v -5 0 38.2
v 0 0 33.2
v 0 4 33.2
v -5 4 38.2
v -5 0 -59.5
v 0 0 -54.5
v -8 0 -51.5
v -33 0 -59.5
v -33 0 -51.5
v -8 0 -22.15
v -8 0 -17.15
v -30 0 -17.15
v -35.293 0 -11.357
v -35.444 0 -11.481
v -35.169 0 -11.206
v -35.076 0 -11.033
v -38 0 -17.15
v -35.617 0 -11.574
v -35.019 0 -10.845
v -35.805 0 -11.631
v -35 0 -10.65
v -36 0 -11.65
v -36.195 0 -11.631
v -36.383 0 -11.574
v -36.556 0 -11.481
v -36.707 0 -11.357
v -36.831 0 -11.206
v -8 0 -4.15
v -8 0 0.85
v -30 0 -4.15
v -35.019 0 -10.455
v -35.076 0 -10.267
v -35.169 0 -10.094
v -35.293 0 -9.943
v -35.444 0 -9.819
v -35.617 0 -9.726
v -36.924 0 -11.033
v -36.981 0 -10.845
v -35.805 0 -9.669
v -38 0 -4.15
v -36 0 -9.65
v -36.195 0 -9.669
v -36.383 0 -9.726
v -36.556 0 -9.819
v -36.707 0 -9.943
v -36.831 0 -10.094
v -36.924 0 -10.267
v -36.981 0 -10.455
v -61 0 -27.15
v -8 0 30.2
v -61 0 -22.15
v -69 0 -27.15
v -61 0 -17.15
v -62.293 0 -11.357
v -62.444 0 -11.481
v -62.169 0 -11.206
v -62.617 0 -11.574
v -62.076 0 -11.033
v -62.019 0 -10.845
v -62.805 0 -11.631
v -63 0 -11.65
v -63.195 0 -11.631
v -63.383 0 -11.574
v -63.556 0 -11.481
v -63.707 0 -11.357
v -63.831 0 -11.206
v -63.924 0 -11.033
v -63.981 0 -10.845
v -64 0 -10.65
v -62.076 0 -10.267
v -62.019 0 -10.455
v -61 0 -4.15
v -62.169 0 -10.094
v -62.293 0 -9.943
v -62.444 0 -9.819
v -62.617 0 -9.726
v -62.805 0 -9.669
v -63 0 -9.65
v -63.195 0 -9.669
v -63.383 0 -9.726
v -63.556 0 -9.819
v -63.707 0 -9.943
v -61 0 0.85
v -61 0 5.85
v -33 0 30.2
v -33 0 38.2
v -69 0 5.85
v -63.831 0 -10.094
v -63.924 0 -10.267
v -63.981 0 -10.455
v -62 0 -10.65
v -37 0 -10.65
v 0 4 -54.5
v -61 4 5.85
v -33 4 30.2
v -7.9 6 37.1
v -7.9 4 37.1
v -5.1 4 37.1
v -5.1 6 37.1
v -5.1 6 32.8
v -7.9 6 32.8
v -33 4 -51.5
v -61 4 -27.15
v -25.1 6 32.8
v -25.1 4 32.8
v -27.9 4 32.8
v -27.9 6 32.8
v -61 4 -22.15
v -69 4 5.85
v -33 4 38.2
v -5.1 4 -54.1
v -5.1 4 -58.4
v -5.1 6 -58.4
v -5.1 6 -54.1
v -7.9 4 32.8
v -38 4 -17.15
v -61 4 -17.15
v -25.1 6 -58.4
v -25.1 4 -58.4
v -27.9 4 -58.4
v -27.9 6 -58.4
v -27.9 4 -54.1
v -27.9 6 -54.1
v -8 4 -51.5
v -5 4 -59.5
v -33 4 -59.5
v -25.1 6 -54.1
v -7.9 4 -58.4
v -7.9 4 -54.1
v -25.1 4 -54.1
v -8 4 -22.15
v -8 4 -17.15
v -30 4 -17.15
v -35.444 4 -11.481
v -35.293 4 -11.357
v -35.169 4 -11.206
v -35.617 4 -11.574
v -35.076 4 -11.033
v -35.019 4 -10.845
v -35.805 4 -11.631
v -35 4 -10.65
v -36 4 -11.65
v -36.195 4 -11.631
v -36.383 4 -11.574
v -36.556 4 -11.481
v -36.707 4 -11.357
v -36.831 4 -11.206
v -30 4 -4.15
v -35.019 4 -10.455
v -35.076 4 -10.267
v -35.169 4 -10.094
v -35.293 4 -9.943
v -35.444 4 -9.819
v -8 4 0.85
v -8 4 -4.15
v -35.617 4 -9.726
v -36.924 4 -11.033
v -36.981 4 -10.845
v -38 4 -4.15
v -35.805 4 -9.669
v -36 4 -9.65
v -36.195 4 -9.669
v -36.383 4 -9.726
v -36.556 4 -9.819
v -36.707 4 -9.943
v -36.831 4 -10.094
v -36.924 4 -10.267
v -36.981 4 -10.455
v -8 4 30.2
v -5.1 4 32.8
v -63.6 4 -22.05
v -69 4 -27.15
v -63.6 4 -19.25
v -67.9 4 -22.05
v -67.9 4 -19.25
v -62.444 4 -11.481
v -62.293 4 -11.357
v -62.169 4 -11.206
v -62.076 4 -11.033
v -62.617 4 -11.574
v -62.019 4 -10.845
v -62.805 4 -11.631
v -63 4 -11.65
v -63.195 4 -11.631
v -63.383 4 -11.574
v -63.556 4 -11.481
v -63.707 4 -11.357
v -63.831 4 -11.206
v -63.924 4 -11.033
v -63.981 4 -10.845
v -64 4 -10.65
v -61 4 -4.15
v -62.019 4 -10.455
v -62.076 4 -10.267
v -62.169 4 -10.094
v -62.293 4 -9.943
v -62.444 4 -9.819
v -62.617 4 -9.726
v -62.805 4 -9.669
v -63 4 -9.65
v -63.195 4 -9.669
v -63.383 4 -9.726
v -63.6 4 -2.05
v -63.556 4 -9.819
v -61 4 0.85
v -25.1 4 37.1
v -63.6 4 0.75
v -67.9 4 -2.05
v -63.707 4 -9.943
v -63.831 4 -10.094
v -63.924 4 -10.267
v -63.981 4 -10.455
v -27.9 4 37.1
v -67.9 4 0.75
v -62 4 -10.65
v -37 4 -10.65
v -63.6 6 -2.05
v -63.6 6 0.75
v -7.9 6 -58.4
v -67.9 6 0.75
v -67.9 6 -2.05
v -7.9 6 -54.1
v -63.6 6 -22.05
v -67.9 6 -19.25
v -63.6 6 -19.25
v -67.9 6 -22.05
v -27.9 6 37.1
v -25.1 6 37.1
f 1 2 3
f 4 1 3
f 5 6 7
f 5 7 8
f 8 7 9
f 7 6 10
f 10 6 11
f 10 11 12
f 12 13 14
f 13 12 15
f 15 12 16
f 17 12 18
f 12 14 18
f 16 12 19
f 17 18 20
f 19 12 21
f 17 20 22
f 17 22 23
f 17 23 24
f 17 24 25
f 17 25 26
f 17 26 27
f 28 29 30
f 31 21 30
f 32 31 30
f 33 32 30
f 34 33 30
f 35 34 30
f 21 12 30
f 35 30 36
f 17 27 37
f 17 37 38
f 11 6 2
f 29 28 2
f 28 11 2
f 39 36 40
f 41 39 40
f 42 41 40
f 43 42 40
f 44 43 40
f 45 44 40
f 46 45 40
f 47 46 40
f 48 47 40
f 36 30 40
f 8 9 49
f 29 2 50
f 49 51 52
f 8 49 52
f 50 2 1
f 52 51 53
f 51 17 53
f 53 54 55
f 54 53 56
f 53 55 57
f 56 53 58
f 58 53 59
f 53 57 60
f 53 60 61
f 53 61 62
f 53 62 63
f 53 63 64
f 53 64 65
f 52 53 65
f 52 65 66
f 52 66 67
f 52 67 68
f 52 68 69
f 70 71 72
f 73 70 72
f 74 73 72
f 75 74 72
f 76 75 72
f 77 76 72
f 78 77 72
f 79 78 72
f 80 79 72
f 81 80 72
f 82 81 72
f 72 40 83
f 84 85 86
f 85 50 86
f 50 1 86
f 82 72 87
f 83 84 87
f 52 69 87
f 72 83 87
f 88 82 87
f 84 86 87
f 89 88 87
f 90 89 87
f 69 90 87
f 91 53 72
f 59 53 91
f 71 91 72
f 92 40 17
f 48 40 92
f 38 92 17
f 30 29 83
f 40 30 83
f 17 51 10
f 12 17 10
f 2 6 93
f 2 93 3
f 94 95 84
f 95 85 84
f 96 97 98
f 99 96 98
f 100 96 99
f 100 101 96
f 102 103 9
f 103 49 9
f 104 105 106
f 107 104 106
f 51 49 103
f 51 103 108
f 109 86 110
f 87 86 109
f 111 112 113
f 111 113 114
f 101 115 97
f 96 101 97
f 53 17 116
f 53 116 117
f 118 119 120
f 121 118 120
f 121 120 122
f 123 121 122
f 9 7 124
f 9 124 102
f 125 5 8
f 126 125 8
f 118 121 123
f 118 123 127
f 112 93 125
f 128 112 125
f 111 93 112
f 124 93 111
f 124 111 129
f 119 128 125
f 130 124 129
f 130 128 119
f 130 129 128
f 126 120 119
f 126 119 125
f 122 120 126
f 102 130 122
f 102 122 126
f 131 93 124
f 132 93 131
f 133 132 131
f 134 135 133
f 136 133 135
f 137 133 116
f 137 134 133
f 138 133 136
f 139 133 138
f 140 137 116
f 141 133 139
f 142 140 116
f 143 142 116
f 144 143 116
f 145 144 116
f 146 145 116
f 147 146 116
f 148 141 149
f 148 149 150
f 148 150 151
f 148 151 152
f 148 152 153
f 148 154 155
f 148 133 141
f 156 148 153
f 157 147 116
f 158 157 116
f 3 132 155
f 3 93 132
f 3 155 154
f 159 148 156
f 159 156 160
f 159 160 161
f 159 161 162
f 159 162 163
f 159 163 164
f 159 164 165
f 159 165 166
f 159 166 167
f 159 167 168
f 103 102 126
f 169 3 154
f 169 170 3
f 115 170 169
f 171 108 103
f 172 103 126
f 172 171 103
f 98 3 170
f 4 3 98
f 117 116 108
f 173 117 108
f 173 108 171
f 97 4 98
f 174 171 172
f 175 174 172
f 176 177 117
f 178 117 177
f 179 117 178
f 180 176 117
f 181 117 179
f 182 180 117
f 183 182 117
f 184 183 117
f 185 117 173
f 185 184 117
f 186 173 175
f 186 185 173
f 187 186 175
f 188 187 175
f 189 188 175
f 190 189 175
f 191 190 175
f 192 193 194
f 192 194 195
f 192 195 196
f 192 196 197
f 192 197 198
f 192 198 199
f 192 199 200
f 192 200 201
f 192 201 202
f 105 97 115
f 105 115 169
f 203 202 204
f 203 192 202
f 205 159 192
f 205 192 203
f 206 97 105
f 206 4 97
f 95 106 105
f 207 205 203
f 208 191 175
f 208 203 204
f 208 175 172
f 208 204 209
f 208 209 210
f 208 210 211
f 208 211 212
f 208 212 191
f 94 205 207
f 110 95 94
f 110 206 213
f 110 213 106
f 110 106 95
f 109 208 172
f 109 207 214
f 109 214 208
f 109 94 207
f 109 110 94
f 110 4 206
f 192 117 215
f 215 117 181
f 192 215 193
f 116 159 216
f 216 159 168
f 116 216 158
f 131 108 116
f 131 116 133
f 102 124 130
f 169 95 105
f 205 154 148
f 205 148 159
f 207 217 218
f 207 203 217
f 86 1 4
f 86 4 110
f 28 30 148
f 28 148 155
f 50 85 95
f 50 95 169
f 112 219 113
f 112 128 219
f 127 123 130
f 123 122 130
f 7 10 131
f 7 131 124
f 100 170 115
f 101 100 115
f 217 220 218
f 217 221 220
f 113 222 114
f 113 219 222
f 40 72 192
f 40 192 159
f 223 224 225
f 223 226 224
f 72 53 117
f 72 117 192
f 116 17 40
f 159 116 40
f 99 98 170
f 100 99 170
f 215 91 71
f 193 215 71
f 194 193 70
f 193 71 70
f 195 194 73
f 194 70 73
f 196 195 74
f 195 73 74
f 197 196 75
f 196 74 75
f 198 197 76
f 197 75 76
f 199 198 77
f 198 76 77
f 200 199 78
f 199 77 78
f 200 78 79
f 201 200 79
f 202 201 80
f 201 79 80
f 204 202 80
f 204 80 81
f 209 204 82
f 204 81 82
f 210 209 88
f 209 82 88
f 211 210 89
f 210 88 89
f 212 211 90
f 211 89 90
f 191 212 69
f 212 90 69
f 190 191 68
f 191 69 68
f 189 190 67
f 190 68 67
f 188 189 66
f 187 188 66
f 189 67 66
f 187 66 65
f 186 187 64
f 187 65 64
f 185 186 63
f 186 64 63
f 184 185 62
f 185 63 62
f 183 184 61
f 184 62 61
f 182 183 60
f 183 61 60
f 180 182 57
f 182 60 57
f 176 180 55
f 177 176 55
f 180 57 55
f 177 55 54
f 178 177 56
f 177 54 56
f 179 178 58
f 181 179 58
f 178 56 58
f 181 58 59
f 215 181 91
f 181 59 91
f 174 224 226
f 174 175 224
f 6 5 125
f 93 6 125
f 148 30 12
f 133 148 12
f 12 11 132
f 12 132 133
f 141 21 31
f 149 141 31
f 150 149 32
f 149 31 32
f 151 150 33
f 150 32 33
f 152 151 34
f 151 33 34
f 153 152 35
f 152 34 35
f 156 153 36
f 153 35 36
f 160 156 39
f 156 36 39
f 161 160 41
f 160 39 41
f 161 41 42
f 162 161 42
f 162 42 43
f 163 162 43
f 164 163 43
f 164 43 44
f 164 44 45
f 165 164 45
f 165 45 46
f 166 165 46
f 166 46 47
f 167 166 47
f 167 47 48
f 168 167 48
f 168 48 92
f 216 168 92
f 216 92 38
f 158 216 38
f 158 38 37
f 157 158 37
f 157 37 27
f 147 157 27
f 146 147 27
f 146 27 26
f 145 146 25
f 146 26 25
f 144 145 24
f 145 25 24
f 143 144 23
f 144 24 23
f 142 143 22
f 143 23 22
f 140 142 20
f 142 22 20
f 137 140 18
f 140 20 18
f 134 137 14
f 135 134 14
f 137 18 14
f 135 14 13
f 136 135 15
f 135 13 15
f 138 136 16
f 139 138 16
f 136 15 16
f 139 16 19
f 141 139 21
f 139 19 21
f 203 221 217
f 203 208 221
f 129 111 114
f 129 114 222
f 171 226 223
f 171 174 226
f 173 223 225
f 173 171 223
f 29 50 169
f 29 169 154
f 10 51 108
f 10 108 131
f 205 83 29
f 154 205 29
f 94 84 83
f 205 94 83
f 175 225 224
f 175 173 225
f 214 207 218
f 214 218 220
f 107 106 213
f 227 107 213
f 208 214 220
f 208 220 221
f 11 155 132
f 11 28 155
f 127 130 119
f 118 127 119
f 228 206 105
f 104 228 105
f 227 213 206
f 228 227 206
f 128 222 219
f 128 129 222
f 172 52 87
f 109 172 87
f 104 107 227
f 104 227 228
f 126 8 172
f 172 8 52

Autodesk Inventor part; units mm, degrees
ref_plane "YZ Plane" through (0, 0, 0) normal (1, 0, 0) x (0, 1, 0)
ref_plane "XZ Plane" through (0, 0, 0) normal (0, 1, 0) x (-1, 0, 0)
ref_plane "XY Plane" through (0, 0, 0) normal (0, 0, 1) x (1, 0, 0)
sketch "Sketch1" plane through (0, 0, 0) normal (0, 1, 0) x (-1, 0, 0)
  line L0 (0, -59.5) -> (33, -59.5)
  line L1 (69, -27.15) -> (69, 5.85)
  line L2 (33, 38.2) -> (69, 5.85)
  line L3 (33, -59.5) -> (69, -27.15)
  line L4 (61, -27.15) -> (33, -51.5)
  line L5 (0, 38.2) -> (33, 38.2)
  line L6 (0, -59.5) -> (0, 38.2)
  line L7 (33, 30.2) -> (8, 30.2)
  line L8 (8, -51.5) -> (33, -51.5)
  line L9 (8, 30.2) -> (8, 0.85)
  line L10 (61, -17.15) -> (61, -4.15)
  line L11 (8, -4.15) -> (8, -17.15)
  line L12 (8, -22.15) -> (8, -51.5)
  line L13 (38, -17.15) -> (38, -4.15)
  line L14 (30, -4.15) -> (30, -17.15)
  line L15 (8, -17.15) -> (30, -17.15)
  line L16 (38, -17.15) -> (61, -17.15)
  line L17 (61, -4.15) -> (38, -4.15)
  line L18 (30, -4.15) -> (8, -4.15)
  line L19 (33, 30.2) -> (61, 5.85)
  line L20 (61, -27.15) -> (61, -22.15)
  line L21 (61, -22.15) -> (8, -22.15)
  line L22 (61, 5.85) -> (61, 0.85)
  line L23 (61, 0.85) -> (8, 0.85)
  point P0 (0, 0)
  point P1 (38, -10.65)
  dimension "d59" = 33
  dimension "d85" = 33
  dimension "d95" = 8
  dimension "d97" = 97.7
  dimension "d99" = 59.5
  dimension "d102" = 69
  dimension "d103" = 8
  dimension "d105" = 23
  dimension "d106" = 13
  dimension "d112" = 8
  dimension "d113" = 8
  dimension "d114" = 8
  dimension "d115" = 8
  dimension "d119" = 8
  dimension "d120" = 13
  dimension "d122" = 8
  dimension "d138" = 5
  dimension "d139" = 5
  dimension "d141" = 5
  dimension "d157" = 5
  dimension "d158" = 48.85
extrude "Extrusion1" add sketch "Sketch1" along normal blind 4
sketch "Sketch4" plane through (0, 4, 0) normal (0, 1, 0) x (1, 0, 0)
  line L0 (-27.9, -37.1) -> (-25.1, -37.1)
  line L1 (-25.1, -37.1) -> (-25.1, -32.8)
  line L2 (-25.1, -32.8) -> (-27.9, -32.8)
  line L3 (-27.9, -32.8) -> (-27.9, -37.1)
  line L4 (-5.1, -32.8) -> (-7.9, -32.8)
  line L5 (-7.9, -32.8) -> (-7.9, -37.1)
  line L6 (-7.9, -37.1) -> (-5.1, -37.1)
  line L7 (-5.1, -37.1) -> (-5.1, -32.8)
  line L8 (-27.9, 54.1) -> (-25.1, 54.1)
  line L9 (-25.1, 54.1) -> (-25.1, 58.4)
  line L10 (-25.1, 58.4) -> (-27.9, 58.4)
  line L11 (-27.9, 58.4) -> (-27.9, 54.1)
  line L12 (-5.1, 54.1) -> (-7.9, 54.1)
  line L13 (-7.9, 54.1) -> (-7.9, 58.4)
  line L14 (-7.9, 58.4) -> (-5.1, 58.4)
  line L15 (-5.1, 58.4) -> (-5.1, 54.1)
  line L16 (0, 59.5) -> (-33, 59.5) projected
  line L17 (0, -38.2) -> (0, 59.5) projected
  line L18 (-33, -38.2) -> (0, -38.2) projected
  line L19 (-63.6, -0.75) -> (-67.9, -0.75)
  line L20 (-67.9, -0.75) -> (-67.9, 2.05)
  line L21 (-67.9, 2.05) -> (-63.6, 2.05)
  line L22 (-63.6, 2.05) -> (-63.6, -0.75)
  line L23 (-63.6, 19.25) -> (-67.9, 19.25)
  line L24 (-67.9, 19.25) -> (-67.9, 22.05)
  line L25 (-67.9, 22.05) -> (-63.6, 22.05)
  line L26 (-63.6, 22.05) -> (-63.6, 19.25)
  line L27 (-69, 27.15) -> (-69, -5.85) projected
  point P0 (0, 0)
  dimension "d60" = 4.3
  dimension "d63" = 2.8
  dimension "d64" = 2.8
  dimension "d66" = 17.2
  dimension "d67" = 4.3
  dimension "d68" = 1.1
  dimension "d133" = 5.1
  dimension "d134" = 1.1
  dimension "d150" = 4.3
  dimension "d151" = 2.8
  dimension "d152" = 4.3
  dimension "d153" = 2.8
  dimension "d154" = 17.2
  dimension "d155" = 1.1
  dimension "d156" = 5.1
extrude "Extrusion5" add sketch "Sketch4" along normal blind 2
chamfer "Chamfer6" distance 5 angle 45 2 edges at (0, 2, -59.5) (0, 2, 38.2)
sketch "Sketch5" plane through (0, 0, 0) normal (0, -1, 0) x (1, 0, 0)
  circle A0 centre (-63, -10.65) radius 1
  circle A1 centre (-36, -10.65) radius 1
  line L0 (-38, -17.15) -> (-38, -4.15) projected
  line L1 (-61, -4.15) -> (-61, -17.15) projected
  line L2 (-38, -4.15) -> (-61, -4.15) projected
  line L3 (-61, -17.15) -> (-38, -17.15) projected
  point P0 (0, 0)
  dimension "d142" = 2
  dimension "d143" = 2
  dimension "d144" = 2
  dimension "d145" = 2
  dimension "d146" = 6.5
  dimension "d147" = 6.5
extrude "Extrusion7" cut sketch "Sketch5" against normal blind 9 contours A0 | A1
properties part number "TopServoMount"
